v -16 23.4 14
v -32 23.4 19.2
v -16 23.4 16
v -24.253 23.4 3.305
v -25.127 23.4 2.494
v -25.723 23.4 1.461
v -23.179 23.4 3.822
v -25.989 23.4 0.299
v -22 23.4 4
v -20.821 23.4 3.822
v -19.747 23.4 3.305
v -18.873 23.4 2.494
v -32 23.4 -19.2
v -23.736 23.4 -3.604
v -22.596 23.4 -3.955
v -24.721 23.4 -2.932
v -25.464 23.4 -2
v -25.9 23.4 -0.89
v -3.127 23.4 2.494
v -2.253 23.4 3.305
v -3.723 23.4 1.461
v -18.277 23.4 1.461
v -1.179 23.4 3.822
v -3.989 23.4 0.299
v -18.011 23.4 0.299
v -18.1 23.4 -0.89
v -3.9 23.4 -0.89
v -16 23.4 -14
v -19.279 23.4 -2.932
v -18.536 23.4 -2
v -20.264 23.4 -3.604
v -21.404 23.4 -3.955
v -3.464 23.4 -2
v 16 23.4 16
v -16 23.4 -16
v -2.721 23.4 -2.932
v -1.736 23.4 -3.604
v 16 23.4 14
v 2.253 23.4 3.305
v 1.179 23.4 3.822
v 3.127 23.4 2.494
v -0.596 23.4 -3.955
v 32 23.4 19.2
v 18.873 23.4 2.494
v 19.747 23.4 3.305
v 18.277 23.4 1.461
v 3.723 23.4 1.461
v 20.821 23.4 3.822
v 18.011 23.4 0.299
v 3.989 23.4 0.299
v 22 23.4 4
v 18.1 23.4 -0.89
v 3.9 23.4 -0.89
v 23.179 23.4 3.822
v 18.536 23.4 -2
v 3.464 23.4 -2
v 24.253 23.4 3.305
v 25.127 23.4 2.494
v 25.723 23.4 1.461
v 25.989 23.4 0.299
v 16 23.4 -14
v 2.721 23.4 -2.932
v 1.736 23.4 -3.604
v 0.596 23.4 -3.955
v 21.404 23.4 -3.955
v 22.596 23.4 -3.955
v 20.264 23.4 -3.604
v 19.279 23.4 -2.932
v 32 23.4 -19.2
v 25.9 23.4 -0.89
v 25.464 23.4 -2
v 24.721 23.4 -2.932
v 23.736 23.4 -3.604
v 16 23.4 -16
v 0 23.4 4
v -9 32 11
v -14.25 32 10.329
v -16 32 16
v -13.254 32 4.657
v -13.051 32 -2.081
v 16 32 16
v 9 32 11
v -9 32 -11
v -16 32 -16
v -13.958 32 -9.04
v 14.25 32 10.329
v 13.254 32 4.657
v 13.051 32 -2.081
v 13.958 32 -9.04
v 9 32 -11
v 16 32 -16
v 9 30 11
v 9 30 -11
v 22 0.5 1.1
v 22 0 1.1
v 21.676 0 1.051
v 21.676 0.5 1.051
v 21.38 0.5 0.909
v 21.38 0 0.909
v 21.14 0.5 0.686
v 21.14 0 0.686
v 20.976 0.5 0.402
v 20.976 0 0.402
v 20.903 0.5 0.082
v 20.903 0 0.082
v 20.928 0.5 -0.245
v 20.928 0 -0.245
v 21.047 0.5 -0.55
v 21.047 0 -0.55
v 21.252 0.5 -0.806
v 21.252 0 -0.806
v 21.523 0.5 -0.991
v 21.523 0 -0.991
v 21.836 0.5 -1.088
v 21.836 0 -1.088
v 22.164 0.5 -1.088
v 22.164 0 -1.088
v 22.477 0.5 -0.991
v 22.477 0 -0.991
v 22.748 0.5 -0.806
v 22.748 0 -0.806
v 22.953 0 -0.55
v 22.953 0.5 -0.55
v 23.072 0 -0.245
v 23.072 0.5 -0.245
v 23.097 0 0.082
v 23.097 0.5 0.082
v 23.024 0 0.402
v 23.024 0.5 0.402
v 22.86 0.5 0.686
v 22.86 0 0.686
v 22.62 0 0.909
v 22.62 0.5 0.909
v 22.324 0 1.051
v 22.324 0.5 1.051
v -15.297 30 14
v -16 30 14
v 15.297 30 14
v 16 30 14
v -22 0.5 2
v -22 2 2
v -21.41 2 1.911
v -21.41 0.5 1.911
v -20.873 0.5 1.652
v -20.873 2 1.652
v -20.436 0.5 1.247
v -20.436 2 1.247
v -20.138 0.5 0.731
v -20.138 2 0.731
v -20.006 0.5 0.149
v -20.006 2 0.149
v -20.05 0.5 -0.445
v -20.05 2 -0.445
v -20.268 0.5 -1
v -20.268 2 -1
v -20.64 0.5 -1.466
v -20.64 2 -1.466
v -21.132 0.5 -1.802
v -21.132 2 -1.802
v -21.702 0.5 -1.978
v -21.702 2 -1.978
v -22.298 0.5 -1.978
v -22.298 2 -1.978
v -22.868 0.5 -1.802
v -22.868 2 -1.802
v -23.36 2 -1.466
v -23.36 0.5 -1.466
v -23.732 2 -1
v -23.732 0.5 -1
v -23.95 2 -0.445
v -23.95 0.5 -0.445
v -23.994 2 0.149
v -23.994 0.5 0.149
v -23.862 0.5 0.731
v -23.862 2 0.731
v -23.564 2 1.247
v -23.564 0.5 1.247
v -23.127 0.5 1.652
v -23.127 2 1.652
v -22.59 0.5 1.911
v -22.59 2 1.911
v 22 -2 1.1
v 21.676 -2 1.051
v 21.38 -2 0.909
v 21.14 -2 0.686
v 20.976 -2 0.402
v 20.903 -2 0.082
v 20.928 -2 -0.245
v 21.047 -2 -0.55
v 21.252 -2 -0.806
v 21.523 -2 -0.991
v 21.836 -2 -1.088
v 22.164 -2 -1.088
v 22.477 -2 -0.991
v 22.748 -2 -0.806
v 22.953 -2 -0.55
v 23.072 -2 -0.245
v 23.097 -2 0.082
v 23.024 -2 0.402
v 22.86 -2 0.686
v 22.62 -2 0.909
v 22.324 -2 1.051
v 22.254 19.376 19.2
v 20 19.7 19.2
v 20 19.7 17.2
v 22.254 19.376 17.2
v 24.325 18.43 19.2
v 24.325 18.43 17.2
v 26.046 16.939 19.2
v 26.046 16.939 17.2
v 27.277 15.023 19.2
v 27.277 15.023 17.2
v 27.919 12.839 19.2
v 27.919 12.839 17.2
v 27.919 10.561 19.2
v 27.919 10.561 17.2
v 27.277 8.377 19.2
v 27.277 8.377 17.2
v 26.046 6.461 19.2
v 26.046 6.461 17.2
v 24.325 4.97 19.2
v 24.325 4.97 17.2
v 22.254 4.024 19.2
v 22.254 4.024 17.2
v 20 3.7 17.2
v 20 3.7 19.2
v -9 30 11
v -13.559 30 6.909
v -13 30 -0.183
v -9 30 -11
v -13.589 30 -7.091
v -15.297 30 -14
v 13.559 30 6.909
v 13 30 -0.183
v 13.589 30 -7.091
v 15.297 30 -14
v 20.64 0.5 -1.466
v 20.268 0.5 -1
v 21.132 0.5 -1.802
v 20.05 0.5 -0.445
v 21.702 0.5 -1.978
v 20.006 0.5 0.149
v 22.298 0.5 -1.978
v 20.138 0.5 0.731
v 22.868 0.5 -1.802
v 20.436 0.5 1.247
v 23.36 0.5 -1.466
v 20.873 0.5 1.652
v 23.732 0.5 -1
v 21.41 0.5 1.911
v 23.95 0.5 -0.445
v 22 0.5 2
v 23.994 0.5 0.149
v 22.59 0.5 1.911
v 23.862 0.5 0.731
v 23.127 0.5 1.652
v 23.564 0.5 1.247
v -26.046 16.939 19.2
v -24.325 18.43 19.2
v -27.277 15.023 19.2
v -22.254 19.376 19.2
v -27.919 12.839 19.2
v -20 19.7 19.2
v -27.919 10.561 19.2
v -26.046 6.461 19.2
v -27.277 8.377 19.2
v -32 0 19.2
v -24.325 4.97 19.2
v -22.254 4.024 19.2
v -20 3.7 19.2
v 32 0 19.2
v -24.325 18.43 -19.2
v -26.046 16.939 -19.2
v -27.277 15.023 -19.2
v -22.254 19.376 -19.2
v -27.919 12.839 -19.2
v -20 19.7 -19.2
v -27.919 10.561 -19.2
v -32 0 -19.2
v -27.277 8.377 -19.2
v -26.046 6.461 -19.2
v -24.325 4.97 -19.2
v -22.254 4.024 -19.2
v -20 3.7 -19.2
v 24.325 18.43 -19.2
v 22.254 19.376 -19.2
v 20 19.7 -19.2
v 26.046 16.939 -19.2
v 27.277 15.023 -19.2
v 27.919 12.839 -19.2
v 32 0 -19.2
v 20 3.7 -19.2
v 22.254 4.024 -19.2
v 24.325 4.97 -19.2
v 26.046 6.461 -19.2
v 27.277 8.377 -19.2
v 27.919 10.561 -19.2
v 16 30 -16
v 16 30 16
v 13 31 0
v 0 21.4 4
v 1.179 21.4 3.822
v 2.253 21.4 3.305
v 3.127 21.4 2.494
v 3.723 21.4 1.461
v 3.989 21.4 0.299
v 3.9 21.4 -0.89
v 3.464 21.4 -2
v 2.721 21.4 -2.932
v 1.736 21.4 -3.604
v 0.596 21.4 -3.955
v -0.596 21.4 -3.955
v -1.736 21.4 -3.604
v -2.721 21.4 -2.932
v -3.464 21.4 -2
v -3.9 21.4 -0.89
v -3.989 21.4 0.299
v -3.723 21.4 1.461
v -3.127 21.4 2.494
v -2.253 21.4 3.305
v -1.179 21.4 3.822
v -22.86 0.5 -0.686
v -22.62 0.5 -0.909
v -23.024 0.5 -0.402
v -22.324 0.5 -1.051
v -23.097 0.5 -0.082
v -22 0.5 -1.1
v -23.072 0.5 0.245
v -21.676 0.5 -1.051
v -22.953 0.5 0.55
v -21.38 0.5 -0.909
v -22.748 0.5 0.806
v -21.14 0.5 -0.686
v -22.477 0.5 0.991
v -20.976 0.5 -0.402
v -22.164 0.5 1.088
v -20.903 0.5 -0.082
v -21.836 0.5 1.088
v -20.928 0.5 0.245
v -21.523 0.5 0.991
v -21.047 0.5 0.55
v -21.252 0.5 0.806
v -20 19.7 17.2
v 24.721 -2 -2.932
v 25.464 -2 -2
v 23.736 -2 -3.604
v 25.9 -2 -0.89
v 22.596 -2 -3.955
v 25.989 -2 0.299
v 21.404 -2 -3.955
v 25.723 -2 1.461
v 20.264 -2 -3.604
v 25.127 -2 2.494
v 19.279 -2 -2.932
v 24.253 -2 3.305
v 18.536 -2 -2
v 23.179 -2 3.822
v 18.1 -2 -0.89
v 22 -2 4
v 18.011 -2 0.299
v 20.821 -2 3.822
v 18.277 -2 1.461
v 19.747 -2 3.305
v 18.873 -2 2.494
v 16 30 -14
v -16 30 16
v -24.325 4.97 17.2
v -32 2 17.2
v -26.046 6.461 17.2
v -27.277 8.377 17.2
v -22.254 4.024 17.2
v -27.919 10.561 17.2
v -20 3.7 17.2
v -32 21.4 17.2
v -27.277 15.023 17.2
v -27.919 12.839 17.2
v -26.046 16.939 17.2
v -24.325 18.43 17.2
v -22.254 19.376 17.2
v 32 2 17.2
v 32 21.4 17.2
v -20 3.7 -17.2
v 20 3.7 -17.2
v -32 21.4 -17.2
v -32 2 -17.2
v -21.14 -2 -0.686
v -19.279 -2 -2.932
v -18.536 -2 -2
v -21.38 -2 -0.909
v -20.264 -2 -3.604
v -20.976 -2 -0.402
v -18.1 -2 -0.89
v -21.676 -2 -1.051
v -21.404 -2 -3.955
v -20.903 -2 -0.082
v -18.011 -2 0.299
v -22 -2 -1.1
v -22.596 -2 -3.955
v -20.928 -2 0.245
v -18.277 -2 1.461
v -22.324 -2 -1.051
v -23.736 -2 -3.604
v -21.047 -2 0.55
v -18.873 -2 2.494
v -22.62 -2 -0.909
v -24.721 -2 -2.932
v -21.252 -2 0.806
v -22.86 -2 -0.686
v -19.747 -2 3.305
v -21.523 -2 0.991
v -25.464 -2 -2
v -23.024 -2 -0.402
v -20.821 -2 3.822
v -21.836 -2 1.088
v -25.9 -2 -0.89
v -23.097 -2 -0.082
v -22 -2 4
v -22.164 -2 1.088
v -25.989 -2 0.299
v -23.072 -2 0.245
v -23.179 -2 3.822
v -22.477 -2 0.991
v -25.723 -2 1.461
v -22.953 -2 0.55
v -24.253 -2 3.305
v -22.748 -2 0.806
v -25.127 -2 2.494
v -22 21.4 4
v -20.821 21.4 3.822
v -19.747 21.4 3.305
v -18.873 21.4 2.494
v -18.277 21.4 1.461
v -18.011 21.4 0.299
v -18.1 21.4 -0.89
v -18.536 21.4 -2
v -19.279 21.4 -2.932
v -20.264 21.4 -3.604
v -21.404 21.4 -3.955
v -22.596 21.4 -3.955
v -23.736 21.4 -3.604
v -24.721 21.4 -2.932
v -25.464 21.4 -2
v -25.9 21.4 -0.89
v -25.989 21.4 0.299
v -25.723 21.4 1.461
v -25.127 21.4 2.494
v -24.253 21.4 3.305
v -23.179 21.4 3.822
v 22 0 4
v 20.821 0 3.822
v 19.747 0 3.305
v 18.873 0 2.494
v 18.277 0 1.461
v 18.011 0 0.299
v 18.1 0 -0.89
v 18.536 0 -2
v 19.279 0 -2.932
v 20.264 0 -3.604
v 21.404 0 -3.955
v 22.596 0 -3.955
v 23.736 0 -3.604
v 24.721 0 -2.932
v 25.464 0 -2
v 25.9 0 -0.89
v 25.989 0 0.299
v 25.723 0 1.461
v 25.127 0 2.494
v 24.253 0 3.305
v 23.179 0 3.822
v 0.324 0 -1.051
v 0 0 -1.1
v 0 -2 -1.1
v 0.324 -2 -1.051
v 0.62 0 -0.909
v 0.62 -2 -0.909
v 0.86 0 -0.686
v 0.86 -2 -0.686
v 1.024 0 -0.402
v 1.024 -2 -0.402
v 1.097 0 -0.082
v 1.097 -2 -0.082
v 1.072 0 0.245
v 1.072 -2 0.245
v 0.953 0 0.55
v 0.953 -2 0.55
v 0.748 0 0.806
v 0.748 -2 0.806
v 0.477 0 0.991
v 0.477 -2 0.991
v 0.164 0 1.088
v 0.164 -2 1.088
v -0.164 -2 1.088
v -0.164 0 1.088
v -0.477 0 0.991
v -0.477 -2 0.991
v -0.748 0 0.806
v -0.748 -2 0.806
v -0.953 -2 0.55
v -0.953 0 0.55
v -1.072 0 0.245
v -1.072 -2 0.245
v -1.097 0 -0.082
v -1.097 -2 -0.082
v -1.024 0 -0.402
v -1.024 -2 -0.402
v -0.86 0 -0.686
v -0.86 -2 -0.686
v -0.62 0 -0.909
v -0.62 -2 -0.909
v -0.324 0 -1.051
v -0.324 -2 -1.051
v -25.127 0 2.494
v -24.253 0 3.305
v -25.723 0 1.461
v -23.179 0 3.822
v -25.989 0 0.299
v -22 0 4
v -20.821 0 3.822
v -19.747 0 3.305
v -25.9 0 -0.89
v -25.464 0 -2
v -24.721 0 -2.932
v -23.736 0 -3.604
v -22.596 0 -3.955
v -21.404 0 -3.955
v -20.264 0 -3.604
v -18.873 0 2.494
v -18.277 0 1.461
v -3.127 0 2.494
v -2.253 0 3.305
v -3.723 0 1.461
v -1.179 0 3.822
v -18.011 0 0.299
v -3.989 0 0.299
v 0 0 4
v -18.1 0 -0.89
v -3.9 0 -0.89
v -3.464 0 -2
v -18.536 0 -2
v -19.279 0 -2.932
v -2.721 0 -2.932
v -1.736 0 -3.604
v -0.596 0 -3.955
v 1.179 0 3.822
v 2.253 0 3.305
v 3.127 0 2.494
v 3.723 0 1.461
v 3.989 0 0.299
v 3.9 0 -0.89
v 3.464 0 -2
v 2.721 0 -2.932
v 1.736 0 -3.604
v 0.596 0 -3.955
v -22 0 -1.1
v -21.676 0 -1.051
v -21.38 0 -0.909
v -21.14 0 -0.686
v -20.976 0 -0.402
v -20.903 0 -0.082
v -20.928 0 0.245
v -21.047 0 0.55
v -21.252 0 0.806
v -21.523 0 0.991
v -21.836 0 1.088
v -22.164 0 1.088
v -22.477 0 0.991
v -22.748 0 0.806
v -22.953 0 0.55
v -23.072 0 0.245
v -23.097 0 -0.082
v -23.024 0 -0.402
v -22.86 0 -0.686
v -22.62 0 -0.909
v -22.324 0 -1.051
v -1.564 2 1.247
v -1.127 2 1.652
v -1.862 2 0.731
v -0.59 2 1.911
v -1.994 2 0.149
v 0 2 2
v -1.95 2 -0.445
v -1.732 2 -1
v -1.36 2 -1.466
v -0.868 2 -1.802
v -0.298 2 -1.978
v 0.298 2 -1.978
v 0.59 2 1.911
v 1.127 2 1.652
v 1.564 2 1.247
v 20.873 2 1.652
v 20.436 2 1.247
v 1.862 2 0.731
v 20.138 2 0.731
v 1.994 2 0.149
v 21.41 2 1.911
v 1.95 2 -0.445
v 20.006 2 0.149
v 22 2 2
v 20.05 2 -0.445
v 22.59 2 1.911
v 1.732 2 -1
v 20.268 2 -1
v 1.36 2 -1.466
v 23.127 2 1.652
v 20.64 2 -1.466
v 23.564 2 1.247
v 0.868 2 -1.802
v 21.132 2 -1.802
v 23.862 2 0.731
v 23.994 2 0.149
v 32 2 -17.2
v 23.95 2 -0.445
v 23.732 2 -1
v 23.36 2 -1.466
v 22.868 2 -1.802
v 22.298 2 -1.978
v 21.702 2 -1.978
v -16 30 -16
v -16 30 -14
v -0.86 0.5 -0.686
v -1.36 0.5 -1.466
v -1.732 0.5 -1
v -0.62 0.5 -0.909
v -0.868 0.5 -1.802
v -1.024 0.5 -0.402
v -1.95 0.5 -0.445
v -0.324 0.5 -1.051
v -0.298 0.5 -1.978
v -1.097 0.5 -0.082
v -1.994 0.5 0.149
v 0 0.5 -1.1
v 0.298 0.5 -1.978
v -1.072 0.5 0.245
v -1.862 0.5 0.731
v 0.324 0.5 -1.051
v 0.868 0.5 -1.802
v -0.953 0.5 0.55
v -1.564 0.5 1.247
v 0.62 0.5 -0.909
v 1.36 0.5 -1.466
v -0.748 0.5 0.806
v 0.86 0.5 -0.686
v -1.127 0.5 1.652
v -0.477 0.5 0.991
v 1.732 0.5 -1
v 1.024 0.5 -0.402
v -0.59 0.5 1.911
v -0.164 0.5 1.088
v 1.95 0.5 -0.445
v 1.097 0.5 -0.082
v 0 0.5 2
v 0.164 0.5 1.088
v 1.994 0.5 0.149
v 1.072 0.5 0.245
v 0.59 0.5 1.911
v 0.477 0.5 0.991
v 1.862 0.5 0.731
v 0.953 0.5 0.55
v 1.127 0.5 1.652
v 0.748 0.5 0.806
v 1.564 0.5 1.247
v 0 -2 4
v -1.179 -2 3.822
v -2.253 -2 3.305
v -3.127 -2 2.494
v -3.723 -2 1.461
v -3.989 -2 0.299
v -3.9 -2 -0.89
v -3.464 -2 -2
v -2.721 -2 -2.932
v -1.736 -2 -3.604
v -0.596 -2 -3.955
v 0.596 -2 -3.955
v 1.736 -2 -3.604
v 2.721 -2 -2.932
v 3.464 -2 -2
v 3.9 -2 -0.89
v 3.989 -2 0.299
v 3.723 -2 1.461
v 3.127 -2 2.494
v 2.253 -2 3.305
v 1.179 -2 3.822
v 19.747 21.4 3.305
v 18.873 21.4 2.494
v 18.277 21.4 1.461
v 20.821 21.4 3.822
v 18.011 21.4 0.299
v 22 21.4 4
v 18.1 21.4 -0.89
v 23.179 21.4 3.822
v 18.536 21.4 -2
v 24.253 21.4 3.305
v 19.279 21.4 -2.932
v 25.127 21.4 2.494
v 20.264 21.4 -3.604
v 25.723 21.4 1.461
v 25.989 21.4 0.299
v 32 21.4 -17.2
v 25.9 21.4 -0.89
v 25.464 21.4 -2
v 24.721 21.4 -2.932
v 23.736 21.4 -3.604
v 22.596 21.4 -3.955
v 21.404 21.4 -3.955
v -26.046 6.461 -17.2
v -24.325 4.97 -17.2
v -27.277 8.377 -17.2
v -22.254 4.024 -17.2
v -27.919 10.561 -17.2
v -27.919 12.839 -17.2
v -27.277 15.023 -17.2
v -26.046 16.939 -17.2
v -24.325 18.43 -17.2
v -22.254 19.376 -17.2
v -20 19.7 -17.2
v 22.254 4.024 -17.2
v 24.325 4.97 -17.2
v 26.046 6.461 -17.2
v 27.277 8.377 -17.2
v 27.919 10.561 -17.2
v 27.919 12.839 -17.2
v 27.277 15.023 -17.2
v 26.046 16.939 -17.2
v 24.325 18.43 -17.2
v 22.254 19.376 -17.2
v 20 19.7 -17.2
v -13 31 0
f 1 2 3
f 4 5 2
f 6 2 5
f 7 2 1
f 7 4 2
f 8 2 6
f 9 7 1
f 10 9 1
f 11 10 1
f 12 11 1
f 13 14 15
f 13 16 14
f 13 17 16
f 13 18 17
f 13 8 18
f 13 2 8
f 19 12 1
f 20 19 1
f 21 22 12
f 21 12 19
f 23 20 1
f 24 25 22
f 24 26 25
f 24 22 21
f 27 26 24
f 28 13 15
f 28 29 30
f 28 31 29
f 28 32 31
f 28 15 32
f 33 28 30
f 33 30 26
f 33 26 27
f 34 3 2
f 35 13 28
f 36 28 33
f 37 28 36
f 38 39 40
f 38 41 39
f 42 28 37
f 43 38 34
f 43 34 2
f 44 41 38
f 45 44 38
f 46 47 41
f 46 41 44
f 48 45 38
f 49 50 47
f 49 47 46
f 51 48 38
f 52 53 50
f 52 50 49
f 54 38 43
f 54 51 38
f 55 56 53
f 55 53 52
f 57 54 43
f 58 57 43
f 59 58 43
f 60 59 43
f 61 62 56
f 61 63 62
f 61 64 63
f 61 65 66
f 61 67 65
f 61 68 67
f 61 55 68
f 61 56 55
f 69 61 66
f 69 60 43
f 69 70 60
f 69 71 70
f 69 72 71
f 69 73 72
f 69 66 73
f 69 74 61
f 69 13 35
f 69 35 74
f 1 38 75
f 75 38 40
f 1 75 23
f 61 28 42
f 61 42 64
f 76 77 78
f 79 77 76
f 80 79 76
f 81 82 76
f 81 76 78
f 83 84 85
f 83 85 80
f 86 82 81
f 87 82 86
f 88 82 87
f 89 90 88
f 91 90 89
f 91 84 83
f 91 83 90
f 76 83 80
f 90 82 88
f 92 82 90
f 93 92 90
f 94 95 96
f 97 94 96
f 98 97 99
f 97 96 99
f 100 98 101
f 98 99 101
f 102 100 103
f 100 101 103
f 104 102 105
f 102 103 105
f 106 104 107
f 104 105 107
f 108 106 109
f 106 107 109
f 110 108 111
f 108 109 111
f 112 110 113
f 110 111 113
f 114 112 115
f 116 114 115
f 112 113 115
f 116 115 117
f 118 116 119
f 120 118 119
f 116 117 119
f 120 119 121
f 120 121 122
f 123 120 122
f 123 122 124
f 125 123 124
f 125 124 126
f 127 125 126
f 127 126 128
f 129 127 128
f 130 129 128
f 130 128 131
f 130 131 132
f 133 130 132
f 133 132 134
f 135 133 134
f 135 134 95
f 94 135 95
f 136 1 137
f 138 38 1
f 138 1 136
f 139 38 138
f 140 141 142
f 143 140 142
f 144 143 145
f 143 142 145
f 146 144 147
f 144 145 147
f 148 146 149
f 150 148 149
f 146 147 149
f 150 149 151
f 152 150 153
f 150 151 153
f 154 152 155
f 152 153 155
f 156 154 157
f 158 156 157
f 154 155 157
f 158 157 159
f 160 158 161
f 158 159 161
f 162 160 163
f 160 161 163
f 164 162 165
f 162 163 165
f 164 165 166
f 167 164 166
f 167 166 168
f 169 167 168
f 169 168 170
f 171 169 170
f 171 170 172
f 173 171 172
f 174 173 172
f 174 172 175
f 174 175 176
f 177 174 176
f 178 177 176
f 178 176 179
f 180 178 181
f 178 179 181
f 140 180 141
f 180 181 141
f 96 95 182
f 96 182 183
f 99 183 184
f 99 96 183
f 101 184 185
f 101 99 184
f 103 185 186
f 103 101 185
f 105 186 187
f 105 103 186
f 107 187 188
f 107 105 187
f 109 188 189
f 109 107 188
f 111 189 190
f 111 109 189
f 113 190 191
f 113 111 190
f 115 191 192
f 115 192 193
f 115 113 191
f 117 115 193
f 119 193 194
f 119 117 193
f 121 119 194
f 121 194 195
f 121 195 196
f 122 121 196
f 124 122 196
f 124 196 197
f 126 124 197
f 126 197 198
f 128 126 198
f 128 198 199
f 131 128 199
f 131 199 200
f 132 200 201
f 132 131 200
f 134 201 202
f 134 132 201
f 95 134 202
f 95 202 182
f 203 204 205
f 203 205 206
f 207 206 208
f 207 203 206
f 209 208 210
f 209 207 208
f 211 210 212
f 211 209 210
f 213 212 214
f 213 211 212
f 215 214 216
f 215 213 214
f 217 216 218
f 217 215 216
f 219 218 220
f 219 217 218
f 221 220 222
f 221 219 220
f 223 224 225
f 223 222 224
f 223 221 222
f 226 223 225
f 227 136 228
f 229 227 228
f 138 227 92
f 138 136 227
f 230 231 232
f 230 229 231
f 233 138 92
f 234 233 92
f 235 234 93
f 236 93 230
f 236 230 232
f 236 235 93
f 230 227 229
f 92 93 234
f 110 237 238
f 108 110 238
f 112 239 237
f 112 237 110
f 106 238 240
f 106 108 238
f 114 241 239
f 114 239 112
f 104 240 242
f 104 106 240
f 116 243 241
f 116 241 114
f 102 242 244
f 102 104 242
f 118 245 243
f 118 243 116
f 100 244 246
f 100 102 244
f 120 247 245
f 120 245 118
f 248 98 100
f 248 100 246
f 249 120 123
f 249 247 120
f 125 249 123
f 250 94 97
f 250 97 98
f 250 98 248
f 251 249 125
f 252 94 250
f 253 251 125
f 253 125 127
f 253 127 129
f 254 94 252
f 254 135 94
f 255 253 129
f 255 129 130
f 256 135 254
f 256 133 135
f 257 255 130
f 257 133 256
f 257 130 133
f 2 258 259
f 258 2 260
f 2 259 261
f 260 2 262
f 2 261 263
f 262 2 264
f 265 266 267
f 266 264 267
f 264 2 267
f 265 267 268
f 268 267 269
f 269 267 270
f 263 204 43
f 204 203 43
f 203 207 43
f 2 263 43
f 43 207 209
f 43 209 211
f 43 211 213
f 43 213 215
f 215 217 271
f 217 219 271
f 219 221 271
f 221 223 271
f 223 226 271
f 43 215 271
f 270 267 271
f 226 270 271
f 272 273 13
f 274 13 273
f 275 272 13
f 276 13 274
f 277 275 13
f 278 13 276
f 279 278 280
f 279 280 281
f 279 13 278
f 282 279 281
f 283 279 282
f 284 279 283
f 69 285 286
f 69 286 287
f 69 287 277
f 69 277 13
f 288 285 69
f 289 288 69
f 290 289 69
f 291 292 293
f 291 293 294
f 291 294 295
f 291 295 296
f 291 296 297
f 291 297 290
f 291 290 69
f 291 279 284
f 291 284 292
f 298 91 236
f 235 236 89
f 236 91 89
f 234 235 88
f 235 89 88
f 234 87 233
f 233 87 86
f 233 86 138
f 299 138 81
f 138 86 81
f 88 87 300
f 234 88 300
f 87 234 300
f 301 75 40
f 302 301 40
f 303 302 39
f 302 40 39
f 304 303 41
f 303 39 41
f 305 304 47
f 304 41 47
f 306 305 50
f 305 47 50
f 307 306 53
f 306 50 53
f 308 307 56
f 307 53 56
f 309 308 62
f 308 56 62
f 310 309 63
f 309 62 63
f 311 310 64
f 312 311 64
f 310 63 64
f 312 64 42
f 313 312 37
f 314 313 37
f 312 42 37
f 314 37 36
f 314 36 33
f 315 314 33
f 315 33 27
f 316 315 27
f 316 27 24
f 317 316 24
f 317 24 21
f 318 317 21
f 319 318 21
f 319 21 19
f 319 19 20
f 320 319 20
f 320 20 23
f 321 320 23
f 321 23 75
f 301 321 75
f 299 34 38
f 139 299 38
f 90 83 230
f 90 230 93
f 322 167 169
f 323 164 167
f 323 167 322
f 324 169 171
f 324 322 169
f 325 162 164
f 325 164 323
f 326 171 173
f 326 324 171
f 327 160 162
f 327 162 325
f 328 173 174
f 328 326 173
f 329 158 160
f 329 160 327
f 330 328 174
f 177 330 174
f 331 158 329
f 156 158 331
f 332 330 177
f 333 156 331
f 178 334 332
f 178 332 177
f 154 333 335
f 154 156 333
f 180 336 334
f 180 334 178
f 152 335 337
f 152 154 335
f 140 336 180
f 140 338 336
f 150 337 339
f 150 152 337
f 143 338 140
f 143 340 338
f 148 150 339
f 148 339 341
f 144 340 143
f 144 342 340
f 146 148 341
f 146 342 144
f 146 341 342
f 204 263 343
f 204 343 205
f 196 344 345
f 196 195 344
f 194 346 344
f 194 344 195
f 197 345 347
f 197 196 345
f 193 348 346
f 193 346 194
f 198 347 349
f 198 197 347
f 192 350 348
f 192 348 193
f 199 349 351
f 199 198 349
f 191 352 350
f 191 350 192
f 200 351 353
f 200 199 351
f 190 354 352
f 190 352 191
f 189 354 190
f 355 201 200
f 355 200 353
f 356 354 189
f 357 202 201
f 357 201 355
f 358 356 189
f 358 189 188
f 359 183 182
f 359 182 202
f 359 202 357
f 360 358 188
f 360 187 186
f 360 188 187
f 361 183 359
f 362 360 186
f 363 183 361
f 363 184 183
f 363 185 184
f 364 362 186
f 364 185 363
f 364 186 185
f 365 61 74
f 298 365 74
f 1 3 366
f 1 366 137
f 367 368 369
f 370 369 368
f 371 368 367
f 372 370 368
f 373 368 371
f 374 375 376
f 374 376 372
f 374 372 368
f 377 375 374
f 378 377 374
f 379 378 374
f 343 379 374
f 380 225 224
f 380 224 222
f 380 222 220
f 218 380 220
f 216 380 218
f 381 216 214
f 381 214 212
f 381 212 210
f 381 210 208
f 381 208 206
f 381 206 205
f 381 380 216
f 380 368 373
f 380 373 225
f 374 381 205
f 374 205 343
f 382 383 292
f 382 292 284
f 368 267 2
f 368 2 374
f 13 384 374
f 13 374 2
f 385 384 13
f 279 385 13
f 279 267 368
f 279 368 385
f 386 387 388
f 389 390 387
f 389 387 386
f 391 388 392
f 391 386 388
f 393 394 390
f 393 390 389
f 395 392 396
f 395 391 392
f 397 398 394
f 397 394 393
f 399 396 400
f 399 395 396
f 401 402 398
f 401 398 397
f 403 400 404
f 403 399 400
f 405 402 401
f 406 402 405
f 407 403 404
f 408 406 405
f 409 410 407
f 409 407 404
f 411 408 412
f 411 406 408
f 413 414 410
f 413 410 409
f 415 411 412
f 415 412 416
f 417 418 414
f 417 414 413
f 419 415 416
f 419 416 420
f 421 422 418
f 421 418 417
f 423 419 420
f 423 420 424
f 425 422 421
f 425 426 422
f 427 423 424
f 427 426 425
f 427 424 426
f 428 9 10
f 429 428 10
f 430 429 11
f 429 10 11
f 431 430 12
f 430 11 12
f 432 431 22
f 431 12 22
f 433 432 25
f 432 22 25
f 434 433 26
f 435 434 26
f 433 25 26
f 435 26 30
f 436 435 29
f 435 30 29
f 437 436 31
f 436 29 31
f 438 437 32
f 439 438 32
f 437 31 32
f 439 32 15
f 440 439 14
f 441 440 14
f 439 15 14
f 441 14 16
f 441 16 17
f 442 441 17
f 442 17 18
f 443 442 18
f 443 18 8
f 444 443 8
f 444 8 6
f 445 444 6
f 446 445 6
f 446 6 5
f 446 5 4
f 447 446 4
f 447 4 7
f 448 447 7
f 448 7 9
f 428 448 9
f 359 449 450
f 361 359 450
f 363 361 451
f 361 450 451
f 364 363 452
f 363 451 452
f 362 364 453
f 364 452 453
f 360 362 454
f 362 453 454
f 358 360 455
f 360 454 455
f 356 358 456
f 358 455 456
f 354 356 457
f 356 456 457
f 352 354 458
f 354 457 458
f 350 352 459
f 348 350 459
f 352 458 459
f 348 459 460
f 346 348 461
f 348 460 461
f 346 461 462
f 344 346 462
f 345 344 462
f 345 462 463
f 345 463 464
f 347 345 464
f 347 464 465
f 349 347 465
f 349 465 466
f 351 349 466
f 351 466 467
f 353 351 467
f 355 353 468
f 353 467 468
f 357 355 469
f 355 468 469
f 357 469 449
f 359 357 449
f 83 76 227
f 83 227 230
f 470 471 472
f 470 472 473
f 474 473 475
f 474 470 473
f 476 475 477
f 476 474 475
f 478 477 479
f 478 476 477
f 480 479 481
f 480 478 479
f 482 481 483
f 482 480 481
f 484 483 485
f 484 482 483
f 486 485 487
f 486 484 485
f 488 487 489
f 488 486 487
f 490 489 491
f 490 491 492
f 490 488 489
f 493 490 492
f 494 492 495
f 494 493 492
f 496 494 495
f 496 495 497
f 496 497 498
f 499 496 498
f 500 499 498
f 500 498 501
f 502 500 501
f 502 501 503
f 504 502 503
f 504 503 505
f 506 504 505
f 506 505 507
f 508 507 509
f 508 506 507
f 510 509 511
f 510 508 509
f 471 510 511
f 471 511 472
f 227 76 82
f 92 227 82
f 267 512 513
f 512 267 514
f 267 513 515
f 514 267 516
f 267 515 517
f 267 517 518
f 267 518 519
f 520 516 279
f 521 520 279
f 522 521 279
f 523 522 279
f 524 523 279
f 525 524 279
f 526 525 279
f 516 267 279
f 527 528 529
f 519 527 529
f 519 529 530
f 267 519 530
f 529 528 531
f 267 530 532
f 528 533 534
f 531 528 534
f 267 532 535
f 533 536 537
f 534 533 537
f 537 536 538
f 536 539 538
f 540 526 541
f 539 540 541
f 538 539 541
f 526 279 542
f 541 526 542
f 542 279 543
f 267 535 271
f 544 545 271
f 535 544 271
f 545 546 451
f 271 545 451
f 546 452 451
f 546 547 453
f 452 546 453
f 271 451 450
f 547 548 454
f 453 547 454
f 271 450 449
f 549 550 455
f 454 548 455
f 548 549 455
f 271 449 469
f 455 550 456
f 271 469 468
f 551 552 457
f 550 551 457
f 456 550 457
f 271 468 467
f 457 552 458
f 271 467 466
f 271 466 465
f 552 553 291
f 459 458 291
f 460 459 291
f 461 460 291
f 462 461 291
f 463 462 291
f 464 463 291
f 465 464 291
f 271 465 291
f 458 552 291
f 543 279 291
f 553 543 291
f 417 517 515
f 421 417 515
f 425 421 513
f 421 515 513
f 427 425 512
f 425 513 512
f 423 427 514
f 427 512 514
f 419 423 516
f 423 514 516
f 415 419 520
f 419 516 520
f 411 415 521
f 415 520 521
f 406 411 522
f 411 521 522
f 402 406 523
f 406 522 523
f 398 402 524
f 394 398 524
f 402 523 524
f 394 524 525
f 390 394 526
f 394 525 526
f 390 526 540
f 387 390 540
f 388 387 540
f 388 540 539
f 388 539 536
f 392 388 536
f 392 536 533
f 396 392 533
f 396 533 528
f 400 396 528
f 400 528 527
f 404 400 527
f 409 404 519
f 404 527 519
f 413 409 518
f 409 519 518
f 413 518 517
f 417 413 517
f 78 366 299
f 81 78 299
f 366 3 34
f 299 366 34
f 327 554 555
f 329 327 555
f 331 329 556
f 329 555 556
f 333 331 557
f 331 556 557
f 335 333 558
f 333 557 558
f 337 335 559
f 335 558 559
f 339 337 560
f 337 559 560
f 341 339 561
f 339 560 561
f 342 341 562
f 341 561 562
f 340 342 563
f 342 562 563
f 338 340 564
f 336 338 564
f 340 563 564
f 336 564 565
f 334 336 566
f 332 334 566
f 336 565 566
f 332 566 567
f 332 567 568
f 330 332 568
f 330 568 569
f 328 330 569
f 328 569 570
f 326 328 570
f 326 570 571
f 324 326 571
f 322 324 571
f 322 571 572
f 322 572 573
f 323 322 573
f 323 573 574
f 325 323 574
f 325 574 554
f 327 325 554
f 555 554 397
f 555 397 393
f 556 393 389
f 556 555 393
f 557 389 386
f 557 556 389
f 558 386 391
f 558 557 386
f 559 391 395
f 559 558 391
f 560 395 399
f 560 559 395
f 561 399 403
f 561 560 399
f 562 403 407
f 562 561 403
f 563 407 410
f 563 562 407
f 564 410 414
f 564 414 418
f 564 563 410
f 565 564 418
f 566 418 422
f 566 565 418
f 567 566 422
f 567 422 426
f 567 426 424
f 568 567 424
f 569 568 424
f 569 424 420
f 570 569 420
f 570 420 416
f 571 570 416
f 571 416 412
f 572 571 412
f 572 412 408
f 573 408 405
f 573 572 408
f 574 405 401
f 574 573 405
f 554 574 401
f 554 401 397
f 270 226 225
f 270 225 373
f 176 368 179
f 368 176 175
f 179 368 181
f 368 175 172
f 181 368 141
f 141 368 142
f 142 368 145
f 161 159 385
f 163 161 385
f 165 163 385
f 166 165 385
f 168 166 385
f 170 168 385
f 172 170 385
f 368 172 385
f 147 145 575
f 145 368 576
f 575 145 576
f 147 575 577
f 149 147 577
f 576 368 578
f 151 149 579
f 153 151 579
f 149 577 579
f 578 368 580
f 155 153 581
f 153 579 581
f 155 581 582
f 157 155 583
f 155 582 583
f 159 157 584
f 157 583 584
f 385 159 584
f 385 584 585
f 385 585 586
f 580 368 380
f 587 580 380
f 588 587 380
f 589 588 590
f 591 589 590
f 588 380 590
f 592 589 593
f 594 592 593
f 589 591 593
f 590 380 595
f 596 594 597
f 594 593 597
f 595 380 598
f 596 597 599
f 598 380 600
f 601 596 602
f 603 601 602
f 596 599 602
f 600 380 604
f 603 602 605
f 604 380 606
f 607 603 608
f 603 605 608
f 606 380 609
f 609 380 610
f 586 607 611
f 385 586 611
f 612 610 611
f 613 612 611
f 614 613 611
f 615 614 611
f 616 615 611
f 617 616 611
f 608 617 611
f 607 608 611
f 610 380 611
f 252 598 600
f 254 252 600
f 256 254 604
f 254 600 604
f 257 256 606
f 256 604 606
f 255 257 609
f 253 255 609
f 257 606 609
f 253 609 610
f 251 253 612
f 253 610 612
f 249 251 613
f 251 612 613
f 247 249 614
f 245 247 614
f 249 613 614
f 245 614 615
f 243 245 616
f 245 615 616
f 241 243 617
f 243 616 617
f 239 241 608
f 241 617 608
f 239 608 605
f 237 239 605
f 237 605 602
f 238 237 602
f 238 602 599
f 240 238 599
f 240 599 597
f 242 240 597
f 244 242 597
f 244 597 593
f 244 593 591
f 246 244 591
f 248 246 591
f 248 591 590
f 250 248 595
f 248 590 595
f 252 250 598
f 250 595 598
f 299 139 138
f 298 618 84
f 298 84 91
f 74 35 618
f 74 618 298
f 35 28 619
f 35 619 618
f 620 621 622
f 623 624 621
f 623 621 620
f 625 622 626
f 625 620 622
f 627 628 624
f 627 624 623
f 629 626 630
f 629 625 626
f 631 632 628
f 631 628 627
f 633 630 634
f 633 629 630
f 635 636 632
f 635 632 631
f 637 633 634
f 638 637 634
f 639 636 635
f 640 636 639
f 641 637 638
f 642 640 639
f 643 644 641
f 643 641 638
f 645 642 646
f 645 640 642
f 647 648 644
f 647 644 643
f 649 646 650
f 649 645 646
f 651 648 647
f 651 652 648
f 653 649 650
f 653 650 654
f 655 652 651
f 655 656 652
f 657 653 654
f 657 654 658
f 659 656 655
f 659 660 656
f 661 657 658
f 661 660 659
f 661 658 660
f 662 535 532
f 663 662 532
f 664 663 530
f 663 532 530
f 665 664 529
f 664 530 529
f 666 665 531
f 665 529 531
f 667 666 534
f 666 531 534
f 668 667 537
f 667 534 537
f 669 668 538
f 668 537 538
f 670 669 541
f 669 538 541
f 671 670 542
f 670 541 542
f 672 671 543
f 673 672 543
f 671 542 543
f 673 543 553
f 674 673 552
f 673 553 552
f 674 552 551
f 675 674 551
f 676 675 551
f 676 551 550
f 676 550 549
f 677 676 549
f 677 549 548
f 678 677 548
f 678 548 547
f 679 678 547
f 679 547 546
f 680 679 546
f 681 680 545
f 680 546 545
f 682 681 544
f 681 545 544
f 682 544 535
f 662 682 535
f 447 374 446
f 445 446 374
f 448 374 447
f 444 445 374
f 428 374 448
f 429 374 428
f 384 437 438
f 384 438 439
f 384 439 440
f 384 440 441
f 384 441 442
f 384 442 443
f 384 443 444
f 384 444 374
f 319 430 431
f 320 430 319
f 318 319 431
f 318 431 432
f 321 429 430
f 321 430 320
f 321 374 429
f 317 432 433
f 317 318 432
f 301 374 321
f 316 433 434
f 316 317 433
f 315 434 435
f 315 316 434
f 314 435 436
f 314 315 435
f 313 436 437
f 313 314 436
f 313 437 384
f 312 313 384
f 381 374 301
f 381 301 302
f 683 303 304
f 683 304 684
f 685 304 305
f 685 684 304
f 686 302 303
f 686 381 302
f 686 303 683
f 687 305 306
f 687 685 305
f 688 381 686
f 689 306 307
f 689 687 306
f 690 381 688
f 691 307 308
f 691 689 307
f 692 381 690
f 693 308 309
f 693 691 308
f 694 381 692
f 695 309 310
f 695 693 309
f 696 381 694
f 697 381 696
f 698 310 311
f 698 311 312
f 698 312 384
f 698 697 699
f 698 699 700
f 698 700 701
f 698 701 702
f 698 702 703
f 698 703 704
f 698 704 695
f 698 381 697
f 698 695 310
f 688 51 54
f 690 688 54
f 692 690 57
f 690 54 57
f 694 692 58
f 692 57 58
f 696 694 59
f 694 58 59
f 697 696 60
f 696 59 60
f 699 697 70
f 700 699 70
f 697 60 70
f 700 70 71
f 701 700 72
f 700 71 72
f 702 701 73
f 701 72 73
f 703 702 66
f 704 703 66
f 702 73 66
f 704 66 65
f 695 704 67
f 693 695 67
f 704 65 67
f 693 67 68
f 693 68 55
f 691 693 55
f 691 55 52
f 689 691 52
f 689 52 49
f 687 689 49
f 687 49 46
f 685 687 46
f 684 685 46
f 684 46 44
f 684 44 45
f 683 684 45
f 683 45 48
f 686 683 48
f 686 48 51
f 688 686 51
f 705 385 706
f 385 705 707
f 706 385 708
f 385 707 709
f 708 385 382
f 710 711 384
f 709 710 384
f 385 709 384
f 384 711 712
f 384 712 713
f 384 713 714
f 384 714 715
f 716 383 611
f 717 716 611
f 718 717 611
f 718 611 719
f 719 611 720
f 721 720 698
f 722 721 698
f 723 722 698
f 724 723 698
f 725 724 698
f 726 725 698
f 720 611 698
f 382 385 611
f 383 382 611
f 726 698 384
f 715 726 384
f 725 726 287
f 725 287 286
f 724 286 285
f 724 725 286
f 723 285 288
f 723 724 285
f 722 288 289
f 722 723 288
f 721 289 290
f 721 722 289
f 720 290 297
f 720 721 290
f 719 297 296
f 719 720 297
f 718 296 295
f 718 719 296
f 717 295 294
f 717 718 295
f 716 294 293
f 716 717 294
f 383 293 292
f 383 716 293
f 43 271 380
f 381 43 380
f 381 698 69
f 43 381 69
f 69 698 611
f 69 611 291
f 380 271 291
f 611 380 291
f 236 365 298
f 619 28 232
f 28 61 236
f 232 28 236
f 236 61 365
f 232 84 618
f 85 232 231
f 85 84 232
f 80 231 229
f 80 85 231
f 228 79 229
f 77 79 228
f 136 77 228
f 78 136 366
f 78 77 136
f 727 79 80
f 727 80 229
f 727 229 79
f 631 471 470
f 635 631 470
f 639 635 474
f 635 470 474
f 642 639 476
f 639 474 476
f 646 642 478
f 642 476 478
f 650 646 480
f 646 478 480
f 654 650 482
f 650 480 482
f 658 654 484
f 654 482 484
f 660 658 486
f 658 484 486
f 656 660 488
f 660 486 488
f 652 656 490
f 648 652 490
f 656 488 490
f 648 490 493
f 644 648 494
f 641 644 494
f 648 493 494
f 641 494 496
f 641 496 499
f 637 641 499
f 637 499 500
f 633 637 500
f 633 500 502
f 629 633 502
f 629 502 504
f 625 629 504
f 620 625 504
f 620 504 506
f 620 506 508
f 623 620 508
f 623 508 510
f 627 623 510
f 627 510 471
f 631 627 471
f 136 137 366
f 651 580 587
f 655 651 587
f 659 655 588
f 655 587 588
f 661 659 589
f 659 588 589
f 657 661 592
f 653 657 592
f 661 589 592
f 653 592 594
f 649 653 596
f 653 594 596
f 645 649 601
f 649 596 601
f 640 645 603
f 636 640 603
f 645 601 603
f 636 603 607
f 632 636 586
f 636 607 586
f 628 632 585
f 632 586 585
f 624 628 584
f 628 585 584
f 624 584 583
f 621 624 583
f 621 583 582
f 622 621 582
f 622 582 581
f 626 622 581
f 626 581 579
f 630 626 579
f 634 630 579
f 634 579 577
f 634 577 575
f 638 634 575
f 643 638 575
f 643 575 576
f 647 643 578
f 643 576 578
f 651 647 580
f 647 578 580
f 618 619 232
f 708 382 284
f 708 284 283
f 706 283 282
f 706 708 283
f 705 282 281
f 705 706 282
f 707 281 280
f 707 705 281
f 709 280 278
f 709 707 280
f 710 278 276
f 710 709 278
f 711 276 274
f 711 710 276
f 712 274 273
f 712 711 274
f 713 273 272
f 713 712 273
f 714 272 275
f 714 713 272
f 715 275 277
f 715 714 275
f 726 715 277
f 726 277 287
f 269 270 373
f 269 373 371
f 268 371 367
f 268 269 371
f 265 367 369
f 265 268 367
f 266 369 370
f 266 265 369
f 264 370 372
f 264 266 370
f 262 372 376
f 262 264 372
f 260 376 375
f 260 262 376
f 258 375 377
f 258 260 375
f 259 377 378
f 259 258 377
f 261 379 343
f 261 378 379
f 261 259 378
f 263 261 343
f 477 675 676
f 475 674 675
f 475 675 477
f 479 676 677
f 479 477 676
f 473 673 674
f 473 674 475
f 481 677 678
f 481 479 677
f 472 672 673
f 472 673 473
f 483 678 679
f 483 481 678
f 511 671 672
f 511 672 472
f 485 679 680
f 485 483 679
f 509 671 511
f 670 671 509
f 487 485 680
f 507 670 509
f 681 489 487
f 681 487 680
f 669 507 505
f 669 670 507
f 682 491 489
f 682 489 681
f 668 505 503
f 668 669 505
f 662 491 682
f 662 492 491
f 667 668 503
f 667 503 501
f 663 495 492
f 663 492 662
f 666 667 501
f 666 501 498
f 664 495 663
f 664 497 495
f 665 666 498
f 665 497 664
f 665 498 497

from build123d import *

# Parameters (mm, degrees)
SKETCH_12_W          = 64
SKETCH_12_H          = 38.4
EXTRUDE_2_DEPTH      = 23.4
SKETCH_13_W          = 34.4
SKETCH_13_H          = 19.4
CUT_EXTRUDE_10_DEPTH = 71.796892587
SKETCH_14_R          = 4
SKETCH_14_R_2        = 1.1
EXTRUDE_3_DEPTH      = 2
CUT_EXTRUDE_11_DEPTH = 56.191666038
CUT_EXTRUDE_13_REACH = 47.142
SKETCH_17_R          = 1.1
SKETCH_18_R          = 2
CUT_EXTRUDE_14_DEPTH = 1.5
SKETCH_20_W          = 32
SKETCH_20_H          = 32
EXTRUDE_5_DEPTH      = 8.6
SKETCH_21_W          = 28
SKETCH_21_H          = 6.6
CUT_EXTRUDE_16_DEPTH = 61.8
SKETCH_23_W          = 18
SKETCH_23_H          = 22
CUT_EXTRUDE_18_DEPTH = 2
SKETCH_22_R          = 4
CUT_EXTRUDE_17_DEPTH = 30


with BuildPart() as part:
    # 草图12 → 凸台-拉伸2 (new body)
    with BuildSketch(Plane(origin=(0, 0, 0), x_dir=(1, 0, 0), z_dir=(0, 1, 0))):
        Rectangle(SKETCH_12_W, SKETCH_12_H)
    extrude(amount=EXTRUDE_2_DEPTH)

    # 草图13 → 切除-拉伸10 (cut, through all)
    with BuildSketch(Plane(origin=(32, 0, 0), x_dir=(0, 0, -1), z_dir=(1, 0, 0))):
        with Locations((0, 11.7)):
            Rectangle(SKETCH_13_W, SKETCH_13_H)
    extrude(amount=-CUT_EXTRUDE_10_DEPTH, mode=Mode.SUBTRACT)

    # 草图14 → 凸台-拉伸3 (add)
    # profile 1 of 3: a face of its own
    with BuildSketch(Plane.XZ):
        with Locations(Location((-22, 0, 0), (0, 0, 90))):
            Circle(SKETCH_14_R)
        with Locations(Location((-22, 0, 0), (0, 0, 270))):
            Circle(SKETCH_14_R_2, mode=Mode.SUBTRACT)
    # profile 2 of 3: a face of its own
    with BuildSketch(Plane.XZ):
        with Locations(Location((22, 0, 0), (0, 0, 90))):
            Circle(SKETCH_14_R)
        with Locations(Location((22, 0, 0), (0, 0, 90))):
            Circle(SKETCH_14_R_2, mode=Mode.SUBTRACT)
    # profile 3 of 3: a face of its own
    with BuildSketch(Plane.XZ):
        with Locations(Location((0, 0, 0), (0, 0, 90))):
            Circle(SKETCH_14_R)
        with Locations(Location((0, 0, 0), (0, 0, 270))):
            Circle(SKETCH_14_R_2, mode=Mode.SUBTRACT)
    extrude(amount=EXTRUDE_3_DEPTH)

    # 草图15 → 切除-拉伸11 (cut, through all)
    with BuildSketch(Plane.XY.offset(19.2)):
        with BuildLine():
            Line((-20, 19.7), (20, 19.7))
            ThreePointArc((20, 19.7), (28, 11.7), (20, 3.7))
            Line((20, 3.7), (-20, 3.7))
            ThreePointArc((-20, 3.7), (-28, 11.7), (-20, 19.7))
        make_face()
    extrude(amount=-CUT_EXTRUDE_11_DEPTH, mode=Mode.SUBTRACT)

    # 草图17 → 切除-拉伸13 (cut, up to next)
    with BuildSketch(Plane.XZ.offset(2), mode=Mode.PRIVATE) as cut_extrude_13_sk1:
        with Locations(Location((22, 0, 0), (0, 0, 90))):
            Circle(SKETCH_17_R)
    cut_extrude_13_tool1 = extrude(cut_extrude_13_sk1.sketch, amount=-CUT_EXTRUDE_13_REACH, mode=Mode.PRIVATE) & part.part
    # 草图17 → 切除-拉伸13 (cut, up to next)
    with BuildSketch(Plane.XZ.offset(2), mode=Mode.PRIVATE) as cut_extrude_13_sk2:
        with Locations(Location((-22, 0, 0), (0, 0, 270))):
            Circle(SKETCH_17_R)
    cut_extrude_13_tool2 = extrude(cut_extrude_13_sk2.sketch, amount=-CUT_EXTRUDE_13_REACH, mode=Mode.PRIVATE) & part.part
    # 草图17 → 切除-拉伸13 (cut, up to next)
    with BuildSketch(Plane.XZ.offset(2), mode=Mode.PRIVATE) as cut_extrude_13_sk3:
        with Locations(Location((0, 0, 0), (0, 0, 270))):
            Circle(SKETCH_17_R)
    cut_extrude_13_tool3 = extrude(cut_extrude_13_sk3.sketch, amount=-CUT_EXTRUDE_13_REACH, mode=Mode.PRIVATE) & part.part
    add(cut_extrude_13_tool1.solids().sort_by_distance((22, -2, 0))[0], mode=Mode.SUBTRACT)
    add(cut_extrude_13_tool2.solids().sort_by_distance((-22, -2, 0))[0], mode=Mode.SUBTRACT)
    add(cut_extrude_13_tool3.solids().sort_by_distance((0, -2, 0))[0], mode=Mode.SUBTRACT)

    # 草图18 → 切除-拉伸14 (cut)
    with BuildSketch(Plane(origin=(0, 2, 0), x_dir=(1, 0, 0), z_dir=(0, 1, 0))):
        with Locations(Location((-22, 0, 0), (0, 0, 270))):
            Circle(SKETCH_18_R)
        with Locations(Location((22, 0, 0), (0, 0, 270))):
            Circle(SKETCH_18_R)
        with Locations(Location((0, 0, 0), (0, 0, 270))):
            Circle(SKETCH_18_R)
    extrude(amount=-CUT_EXTRUDE_14_DEPTH, mode=Mode.SUBTRACT)

    # 草图20 → 凸台-拉伸5 (add)
    with BuildSketch(Plane(origin=(0, 23.4, 0), x_dir=(1, 0, 0), z_dir=(0, 1, 0))):
        Rectangle(SKETCH_20_W, SKETCH_20_H)
    extrude(amount=EXTRUDE_5_DEPTH)

    # 草图21 → 切除-拉伸16 (cut, through all)
    with BuildSketch(Plane(origin=(16, 0, 0), x_dir=(0, 0, -1), z_dir=(1, 0, 0))):
        with Locations((0, 26.7)):
            Rectangle(SKETCH_21_W, SKETCH_21_H)
    extrude(amount=-CUT_EXTRUDE_16_DEPTH, mode=Mode.SUBTRACT)

    # 草图23 → 切除-拉伸18 (cut)
    with BuildSketch(Plane(origin=(0, 32, 0), x_dir=(1, 0, 0), z_dir=(0, 1, 0))):
        with BuildLine():
            Line((-16, 16), (-16, -16))
            add(Edge.make_bspline(
                [(-16, 16), (-10, 0), (-16, -16)],
                knots=[0, 0, 0, 1, 1, 1], degree=2))
        make_face()
        with BuildLine():
            Line((16, 16), (16, -16))
            add(Edge.make_bspline(
                [(16, 16), (10, 0), (16, -16)],
                knots=[0, 0, 0, 1, 1, 1], degree=2))
        make_face()
        Rectangle(SKETCH_23_W, SKETCH_23_H)
    extrude(amount=-CUT_EXTRUDE_18_DEPTH, mode=Mode.SUBTRACT)

    # 草图22 → 切除-拉伸17 (cut)
    with BuildSketch(Plane(origin=(0, 32, 0), x_dir=(1, 0, 0), z_dir=(0, 1, 0))):
        with Locations(Location((22, 0, 0), (0, 0, 270))):
            Circle(SKETCH_22_R)
        with Locations(Location((-22, 0, 0), (0, 0, 270))):
            Circle(SKETCH_22_R)
        with Locations(Location((0, 0, 0), (0, 0, 270))):
            Circle(SKETCH_22_R)
    extrude(amount=-CUT_EXTRUDE_17_DEPTH, mode=Mode.SUBTRACT)


solid = part.part
